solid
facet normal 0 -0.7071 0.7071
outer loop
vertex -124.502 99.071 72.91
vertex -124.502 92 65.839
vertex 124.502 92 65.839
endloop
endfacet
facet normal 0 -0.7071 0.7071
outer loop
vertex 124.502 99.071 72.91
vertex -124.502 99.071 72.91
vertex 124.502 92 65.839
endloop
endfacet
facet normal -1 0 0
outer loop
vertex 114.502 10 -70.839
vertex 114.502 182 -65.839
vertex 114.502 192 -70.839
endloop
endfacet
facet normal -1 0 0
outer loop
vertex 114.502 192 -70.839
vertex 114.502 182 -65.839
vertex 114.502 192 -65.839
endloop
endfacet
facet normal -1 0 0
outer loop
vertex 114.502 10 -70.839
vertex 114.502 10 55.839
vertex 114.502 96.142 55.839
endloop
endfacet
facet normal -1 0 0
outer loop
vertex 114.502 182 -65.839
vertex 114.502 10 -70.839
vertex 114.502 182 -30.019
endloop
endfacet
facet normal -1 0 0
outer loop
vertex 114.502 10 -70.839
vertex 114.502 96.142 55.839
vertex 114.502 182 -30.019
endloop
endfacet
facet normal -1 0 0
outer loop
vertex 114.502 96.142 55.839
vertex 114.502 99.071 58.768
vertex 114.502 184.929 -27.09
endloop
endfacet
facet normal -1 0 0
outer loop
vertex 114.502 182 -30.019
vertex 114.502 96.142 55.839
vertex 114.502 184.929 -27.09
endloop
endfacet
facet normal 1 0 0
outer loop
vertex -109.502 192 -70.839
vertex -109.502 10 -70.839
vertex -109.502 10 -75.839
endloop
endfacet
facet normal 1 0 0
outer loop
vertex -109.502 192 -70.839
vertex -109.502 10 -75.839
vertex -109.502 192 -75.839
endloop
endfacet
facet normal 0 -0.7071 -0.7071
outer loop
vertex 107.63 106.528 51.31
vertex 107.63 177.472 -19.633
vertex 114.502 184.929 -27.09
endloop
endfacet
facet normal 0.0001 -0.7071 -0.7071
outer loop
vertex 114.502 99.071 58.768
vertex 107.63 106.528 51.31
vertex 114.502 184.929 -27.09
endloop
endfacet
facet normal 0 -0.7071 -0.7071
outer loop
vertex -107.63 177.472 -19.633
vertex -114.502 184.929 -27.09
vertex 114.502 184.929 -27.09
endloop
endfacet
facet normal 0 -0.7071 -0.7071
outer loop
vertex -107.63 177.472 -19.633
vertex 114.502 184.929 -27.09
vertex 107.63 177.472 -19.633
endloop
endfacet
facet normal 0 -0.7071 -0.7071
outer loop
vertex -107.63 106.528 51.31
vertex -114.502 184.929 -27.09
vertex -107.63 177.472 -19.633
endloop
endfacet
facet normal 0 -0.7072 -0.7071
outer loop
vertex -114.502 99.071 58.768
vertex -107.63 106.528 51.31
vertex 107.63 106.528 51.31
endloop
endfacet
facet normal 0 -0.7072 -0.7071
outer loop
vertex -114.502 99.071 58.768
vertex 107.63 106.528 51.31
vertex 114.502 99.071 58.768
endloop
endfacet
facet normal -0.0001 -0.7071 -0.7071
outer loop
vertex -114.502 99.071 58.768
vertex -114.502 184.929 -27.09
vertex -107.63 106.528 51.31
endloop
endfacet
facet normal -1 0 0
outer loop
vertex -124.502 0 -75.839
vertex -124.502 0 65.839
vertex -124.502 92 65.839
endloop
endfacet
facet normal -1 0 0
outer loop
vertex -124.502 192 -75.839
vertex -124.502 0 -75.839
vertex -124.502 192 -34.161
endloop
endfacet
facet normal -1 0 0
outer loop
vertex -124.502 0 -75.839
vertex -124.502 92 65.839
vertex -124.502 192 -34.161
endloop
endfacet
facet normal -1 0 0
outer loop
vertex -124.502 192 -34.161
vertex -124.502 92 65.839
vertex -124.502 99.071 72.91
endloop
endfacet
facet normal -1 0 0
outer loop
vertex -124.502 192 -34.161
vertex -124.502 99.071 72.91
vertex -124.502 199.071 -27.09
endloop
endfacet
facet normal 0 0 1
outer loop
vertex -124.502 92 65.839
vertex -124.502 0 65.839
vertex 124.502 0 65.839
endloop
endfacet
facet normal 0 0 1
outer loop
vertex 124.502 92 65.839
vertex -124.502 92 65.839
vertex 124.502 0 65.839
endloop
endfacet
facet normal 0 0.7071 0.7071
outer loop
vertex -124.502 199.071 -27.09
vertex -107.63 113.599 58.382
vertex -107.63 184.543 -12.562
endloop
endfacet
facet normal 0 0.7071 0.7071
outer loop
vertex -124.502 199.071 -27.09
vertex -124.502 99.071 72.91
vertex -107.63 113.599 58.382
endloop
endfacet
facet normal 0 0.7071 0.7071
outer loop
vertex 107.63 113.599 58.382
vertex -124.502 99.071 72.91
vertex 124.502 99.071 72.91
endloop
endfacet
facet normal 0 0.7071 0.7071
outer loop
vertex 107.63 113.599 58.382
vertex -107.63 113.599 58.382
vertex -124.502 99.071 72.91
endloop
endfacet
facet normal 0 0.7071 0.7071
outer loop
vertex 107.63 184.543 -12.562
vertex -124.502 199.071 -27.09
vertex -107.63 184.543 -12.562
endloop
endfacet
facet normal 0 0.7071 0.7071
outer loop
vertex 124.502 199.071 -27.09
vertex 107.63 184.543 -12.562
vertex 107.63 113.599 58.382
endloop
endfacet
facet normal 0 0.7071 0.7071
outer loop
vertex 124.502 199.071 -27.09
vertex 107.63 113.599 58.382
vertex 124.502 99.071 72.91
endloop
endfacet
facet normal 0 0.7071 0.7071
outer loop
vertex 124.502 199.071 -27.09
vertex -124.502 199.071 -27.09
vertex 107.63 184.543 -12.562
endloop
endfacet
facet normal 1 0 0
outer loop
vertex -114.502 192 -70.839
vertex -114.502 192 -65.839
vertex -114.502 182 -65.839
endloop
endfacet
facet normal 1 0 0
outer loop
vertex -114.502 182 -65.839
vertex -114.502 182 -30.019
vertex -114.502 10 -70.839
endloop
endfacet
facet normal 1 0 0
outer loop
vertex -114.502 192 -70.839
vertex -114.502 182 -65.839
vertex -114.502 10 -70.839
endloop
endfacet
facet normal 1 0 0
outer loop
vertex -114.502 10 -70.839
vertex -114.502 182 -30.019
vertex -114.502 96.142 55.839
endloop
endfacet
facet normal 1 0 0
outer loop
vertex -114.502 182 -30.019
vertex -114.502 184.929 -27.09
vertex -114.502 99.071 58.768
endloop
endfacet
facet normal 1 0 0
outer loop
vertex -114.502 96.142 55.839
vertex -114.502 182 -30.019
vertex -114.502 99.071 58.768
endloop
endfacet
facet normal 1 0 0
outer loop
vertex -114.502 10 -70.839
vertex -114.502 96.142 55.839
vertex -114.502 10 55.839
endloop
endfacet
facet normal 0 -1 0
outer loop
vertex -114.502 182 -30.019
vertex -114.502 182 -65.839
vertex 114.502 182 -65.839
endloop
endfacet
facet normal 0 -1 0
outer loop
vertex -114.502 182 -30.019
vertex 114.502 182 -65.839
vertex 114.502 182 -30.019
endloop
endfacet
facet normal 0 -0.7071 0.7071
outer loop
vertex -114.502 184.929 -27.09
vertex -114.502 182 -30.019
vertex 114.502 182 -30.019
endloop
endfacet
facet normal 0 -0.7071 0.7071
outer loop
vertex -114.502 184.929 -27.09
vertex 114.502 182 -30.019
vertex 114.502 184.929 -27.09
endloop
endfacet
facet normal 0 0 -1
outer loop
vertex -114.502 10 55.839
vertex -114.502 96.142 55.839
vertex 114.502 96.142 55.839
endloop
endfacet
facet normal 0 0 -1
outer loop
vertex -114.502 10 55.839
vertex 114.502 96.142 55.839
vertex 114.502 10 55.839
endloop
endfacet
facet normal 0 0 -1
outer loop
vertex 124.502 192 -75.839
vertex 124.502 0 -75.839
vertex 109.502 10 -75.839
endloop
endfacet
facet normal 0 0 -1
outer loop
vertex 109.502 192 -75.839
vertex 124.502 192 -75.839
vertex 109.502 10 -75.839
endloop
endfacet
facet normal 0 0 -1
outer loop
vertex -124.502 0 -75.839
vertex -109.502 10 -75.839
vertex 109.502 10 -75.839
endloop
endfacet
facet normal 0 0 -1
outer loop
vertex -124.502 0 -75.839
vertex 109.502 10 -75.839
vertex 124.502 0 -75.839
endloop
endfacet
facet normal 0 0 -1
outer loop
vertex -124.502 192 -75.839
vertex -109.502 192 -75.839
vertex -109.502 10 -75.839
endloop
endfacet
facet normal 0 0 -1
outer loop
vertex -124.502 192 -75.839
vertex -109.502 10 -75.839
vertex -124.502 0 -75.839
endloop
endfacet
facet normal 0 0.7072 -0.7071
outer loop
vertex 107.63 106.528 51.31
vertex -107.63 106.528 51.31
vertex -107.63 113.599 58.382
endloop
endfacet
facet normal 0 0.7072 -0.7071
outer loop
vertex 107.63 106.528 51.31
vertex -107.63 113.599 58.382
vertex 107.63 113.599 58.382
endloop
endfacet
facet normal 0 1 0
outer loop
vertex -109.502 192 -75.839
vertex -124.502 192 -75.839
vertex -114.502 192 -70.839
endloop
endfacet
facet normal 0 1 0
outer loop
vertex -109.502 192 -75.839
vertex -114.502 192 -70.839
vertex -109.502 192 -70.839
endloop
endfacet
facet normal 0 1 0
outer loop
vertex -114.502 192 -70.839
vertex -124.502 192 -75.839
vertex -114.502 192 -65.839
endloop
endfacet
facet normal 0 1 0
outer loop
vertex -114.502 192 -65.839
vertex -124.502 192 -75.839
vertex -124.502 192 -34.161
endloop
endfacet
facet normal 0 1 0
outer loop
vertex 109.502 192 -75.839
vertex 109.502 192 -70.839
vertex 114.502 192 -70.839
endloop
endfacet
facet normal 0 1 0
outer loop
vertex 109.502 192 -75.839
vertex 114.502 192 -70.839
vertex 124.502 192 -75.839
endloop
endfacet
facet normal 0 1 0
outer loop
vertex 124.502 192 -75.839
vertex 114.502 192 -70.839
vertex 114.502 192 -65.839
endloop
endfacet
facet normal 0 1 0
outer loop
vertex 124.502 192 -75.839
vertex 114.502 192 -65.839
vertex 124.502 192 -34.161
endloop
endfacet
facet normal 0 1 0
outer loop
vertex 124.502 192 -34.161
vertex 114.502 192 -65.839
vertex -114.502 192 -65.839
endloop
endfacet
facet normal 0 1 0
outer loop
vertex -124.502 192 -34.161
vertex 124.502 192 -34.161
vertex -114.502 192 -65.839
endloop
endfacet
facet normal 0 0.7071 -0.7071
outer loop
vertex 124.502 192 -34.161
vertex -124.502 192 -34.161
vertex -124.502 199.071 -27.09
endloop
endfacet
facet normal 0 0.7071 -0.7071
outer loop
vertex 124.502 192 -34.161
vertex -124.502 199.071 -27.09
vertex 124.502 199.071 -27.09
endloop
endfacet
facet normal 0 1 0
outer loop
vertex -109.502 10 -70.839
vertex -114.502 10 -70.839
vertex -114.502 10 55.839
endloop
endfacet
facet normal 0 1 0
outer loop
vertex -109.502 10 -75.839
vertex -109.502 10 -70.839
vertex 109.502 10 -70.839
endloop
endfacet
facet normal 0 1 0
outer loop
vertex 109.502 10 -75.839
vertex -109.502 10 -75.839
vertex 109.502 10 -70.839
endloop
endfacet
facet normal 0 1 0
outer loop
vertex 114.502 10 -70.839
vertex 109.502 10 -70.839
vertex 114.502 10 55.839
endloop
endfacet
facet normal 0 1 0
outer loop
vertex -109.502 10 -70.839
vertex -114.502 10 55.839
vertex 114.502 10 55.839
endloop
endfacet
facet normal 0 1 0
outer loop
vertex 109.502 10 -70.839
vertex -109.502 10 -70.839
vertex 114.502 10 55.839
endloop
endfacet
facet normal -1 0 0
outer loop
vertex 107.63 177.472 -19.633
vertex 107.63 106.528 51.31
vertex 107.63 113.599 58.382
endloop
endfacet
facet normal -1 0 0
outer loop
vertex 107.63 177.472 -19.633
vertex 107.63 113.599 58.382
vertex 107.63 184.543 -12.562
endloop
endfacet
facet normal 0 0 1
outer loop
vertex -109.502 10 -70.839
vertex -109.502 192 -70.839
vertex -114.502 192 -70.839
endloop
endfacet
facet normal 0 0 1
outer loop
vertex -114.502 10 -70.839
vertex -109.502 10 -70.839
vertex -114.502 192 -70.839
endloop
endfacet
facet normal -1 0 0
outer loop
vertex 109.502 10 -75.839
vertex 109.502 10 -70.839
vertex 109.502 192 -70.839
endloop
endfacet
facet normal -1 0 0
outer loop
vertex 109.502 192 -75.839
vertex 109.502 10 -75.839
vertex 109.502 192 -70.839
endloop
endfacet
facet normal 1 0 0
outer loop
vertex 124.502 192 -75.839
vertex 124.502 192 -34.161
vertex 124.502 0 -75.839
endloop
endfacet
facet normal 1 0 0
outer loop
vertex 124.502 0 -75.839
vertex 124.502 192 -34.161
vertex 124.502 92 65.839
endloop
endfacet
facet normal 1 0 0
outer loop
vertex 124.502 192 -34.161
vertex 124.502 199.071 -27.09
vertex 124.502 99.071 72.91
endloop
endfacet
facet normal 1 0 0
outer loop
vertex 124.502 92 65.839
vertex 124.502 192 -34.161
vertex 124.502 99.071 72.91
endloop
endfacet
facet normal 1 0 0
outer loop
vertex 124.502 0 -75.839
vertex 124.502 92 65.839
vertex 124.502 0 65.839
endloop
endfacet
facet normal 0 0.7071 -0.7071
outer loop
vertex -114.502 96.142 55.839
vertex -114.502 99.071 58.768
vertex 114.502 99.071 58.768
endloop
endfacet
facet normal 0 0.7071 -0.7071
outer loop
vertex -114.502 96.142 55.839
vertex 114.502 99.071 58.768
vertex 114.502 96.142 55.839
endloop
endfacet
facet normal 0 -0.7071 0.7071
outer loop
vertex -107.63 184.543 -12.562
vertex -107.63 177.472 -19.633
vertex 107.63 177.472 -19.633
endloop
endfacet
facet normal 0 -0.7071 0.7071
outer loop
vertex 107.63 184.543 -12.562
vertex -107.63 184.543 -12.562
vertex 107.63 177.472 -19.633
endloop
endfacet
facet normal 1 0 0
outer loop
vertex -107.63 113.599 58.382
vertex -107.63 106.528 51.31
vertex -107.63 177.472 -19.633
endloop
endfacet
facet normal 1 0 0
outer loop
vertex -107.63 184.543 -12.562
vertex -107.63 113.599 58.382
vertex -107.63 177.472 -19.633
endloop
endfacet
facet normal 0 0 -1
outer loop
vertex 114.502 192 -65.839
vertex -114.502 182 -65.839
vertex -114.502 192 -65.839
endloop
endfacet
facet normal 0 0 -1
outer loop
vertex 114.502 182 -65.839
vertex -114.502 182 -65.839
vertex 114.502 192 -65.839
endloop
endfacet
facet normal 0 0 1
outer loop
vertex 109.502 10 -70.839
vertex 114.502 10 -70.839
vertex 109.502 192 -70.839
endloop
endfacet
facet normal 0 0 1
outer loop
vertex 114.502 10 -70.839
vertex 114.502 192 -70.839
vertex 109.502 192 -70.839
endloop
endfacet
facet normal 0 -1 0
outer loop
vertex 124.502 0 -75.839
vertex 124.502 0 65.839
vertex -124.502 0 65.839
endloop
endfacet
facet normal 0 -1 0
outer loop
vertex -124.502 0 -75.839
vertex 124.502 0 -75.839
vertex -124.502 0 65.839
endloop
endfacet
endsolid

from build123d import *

# Parameters (mm, degrees)
SKETCH1_W           = 249.00380235
SKETCH1_H           = 131.677440474
BOSS_EXTRUDE1_DEPTH = 192
CHAMFER1_SIZE       = 100
SKETCH2_W           = 249.00380235
SKETCH2_H           = 141.421356237
SKETCH2_W_2         = 215.26057226
SKETCH2_H_2         = 100.329330499
BOSS_EXTRUDE2_DEPTH = 10
SHELL1_START        = -114.501901175
SHELL1_DEPTH        = 229.00380235
BOSS_EXTRUDE3_DEPTH = 5
SKETCH4_W           = 5
SKETCH4_H           = 182
BOSS_EXTRUDE4_DEPTH = 5


# Read off the part's stored shape, not the designer's step: Shell1
with BuildPart() as part:
    # Sketch1 → Boss-Extrude1 (new body)
    with BuildSketch(Plane(origin=(0, 0, 0), x_dir=(1, 0, 0), z_dir=(0, 1, 0))):
        Rectangle(SKETCH1_W, SKETCH1_H)
    extrude(amount=BOSS_EXTRUDE1_DEPTH)

    # Chamfer1
    chamfer1_edges = [part.edges().sort_by_distance(p)[0] for p in [
        (0, 192, 65.838720237),
    ]]
    chamfer(chamfer1_edges, length=CHAMFER1_SIZE)

    # Sketch2 → Boss-Extrude2 (add)
    with BuildSketch(Plane(origin=(0, 78.919360119, 78.919360119), x_dir=(1, 0, 0), z_dir=(0, 0.7071067811865464, 0.7071067811865487))):
        with Locations((0, 89.209496444)):
            Rectangle(SKETCH2_W, SKETCH2_H)
        with Locations((0, 89.209496444)):
            Rectangle(SKETCH2_W_2, SKETCH2_H_2, mode=Mode.SUBTRACT)
    extrude(amount=BOSS_EXTRUDE2_DEPTH)

    # Shell1 outline → Shell1 (cut)
    with BuildSketch(Plane.YZ.offset(SHELL1_START)):
        Polygon((96.142135624, 55.838720237), (10, 55.838720237), (10, -65.838720237), (182, -65.838720237), (182, -30.019144139), (184.928932188, -27.090211951), (99.071067812, 58.767652425), align=None)
    extrude(amount=SHELL1_DEPTH, mode=Mode.SUBTRACT)

    # Sketch3 → Boss-Extrude3 (add)
    with BuildSketch(Plane(origin=(0, 0, -65.838720237), x_dir=(-1, 0, 0), z_dir=(0, 0, -1))):
        Polygon((-114.501901175, 10), (-114.501901175, 182), (-114.501901175, 192), (-124.501901175, 192), (-124.501901175, 0), (124.501901175, 0), (124.501901175, 192), (114.501901175, 192), (114.501901175, 182), (114.501901175, 10), align=None)
    extrude(amount=BOSS_EXTRUDE3_DEPTH)

    # Sketch4 → Boss-Extrude4 (add)
    with BuildSketch(Plane(origin=(0, 0, -70.838720237), x_dir=(-1, 0, 0), z_dir=(0, 0, -1))):
        Polygon((124.501901175, 192), (114.501901175, 192), (114.501901175, 10), (-114.501901175, 10), (-114.501901175, 192), (-124.501901175, 192), (-124.501901175, 0), (124.501901175, 0), align=None)
        with Locations((112.001901175, 101)):
            Rectangle(SKETCH4_W, SKETCH4_H)
        with Locations((-112.001901175, 101)):
            Rectangle(SKETCH4_W, SKETCH4_H)
    extrude(amount=BOSS_EXTRUDE4_DEPTH)


solid = part.part
